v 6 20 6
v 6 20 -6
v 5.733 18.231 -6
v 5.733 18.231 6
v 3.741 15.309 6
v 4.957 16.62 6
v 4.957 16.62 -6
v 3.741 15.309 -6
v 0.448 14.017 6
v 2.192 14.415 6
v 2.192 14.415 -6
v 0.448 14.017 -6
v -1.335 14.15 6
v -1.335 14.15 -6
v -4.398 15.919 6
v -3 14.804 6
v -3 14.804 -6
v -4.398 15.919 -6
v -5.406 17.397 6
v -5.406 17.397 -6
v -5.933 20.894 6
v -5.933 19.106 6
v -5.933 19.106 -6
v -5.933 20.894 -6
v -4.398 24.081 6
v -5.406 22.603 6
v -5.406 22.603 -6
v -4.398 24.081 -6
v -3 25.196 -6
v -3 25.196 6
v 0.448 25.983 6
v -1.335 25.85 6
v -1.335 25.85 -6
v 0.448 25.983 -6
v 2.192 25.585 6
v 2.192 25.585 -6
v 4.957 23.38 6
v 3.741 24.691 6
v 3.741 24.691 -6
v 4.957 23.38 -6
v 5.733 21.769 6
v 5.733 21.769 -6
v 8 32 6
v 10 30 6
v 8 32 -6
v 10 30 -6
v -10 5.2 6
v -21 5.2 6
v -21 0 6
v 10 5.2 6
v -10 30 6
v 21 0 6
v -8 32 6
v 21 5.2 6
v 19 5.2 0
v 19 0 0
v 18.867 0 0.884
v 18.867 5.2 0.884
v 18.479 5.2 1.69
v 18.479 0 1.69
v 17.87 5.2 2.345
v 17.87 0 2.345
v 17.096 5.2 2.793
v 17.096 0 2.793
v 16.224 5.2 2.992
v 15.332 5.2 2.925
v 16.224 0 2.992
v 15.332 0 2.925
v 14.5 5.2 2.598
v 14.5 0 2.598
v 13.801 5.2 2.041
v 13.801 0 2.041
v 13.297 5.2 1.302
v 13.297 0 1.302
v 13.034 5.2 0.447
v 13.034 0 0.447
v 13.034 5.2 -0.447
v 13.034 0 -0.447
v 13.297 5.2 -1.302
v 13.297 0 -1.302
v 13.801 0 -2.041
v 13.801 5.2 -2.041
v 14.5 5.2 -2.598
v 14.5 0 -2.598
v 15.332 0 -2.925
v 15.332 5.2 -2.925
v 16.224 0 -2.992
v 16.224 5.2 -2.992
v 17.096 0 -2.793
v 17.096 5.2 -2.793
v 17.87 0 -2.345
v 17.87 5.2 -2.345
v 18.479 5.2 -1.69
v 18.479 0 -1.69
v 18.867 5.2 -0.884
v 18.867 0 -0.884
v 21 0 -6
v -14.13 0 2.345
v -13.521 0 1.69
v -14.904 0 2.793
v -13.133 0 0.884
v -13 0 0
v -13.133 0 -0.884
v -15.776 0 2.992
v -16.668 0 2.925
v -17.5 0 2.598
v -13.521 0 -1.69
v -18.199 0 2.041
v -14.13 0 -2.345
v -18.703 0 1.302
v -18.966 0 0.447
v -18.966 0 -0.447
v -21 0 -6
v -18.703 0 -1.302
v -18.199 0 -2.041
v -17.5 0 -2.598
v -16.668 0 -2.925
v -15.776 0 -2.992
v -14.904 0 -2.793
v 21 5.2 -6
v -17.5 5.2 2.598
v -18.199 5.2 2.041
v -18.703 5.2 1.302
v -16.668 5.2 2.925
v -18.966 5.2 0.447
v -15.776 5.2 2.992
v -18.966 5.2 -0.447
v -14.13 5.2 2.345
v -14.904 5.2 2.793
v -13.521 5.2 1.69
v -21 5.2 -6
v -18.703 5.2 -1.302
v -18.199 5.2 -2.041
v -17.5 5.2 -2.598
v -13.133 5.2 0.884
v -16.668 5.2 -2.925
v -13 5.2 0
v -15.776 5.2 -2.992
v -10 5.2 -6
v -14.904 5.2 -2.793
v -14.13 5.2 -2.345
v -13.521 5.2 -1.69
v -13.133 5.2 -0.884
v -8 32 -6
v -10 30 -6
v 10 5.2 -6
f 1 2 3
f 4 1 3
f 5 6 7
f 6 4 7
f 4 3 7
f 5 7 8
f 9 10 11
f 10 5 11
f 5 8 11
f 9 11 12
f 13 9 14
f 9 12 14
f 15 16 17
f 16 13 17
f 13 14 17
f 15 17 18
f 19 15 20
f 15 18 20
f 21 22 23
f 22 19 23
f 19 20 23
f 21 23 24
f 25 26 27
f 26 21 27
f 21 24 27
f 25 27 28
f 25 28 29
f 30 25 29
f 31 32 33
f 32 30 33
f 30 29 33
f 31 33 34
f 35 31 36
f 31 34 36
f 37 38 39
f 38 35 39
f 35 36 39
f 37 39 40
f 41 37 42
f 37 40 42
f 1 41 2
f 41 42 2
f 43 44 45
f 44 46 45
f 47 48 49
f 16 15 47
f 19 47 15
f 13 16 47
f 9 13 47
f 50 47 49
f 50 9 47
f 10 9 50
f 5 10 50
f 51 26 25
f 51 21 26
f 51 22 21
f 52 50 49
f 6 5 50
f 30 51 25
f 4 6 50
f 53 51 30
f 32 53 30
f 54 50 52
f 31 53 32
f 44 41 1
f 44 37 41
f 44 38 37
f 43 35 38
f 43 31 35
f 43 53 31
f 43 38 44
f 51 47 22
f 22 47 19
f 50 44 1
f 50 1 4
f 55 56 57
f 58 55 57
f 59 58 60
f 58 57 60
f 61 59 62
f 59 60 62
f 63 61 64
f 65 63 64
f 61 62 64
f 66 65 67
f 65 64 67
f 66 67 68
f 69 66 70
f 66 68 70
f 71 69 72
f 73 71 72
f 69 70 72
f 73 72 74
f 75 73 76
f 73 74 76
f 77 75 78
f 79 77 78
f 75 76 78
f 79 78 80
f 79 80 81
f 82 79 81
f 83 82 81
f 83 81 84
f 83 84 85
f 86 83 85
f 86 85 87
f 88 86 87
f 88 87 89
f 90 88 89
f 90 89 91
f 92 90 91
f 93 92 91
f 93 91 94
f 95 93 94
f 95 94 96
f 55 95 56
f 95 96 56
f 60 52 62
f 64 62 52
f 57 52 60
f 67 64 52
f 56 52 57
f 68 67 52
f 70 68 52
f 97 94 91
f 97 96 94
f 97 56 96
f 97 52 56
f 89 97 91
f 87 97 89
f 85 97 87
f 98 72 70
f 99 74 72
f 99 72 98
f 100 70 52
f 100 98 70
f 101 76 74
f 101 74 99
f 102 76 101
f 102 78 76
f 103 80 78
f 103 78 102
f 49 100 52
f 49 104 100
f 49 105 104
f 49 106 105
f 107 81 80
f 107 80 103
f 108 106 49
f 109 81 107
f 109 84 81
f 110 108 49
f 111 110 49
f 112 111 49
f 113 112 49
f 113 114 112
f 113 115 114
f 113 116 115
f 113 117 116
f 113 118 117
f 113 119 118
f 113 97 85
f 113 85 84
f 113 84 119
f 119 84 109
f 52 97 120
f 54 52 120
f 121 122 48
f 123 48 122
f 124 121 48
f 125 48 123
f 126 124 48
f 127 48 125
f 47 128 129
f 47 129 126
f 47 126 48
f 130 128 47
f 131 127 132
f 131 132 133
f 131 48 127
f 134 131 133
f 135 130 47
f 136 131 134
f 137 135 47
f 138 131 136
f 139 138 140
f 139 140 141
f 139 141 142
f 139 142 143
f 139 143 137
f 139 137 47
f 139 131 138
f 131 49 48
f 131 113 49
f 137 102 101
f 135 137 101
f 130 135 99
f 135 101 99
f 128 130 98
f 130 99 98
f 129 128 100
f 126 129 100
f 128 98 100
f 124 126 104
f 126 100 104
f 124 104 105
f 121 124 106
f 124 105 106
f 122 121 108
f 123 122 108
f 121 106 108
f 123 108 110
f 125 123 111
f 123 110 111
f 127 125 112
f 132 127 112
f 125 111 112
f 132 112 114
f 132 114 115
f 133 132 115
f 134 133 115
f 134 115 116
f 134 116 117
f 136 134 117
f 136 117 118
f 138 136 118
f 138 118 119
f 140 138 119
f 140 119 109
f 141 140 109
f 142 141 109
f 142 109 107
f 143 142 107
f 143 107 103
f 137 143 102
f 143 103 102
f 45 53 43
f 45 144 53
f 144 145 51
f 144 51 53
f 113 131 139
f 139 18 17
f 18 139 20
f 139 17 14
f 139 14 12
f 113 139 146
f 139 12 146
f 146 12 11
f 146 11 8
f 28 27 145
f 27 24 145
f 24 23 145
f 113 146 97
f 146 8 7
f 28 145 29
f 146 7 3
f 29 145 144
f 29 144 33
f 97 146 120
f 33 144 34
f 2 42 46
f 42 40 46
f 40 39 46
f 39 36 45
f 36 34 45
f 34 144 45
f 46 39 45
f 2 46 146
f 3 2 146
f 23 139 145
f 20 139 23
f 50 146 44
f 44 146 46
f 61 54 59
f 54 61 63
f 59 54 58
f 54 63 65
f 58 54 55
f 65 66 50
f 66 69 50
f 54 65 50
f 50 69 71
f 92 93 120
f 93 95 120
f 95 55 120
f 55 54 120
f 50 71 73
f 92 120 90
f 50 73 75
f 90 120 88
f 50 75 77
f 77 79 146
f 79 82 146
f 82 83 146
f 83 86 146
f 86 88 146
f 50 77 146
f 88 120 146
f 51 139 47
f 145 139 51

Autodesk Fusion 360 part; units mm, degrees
sketch "Boceto1" plane through (0, 0, 0) normal (0, 0, 1) x (1, 0, 0)
  line L0 (0, 0) -> (21, 0)
  line L1 (21, 0) -> (21, 5.2)
  line L2 (21, 5.2) -> (10, 5.2)
  line L3 (10, 5.2) -> (10, 30)
  line L4 (10, 30) -> (8, 32)
  line L5 (10, 30) -> (23.9079, 30) construction
  line L6 (8, 32) -> (0, 32)
  line L7 (0, 0) -> (0, 32) construction
  line L8 (-10, 30) -> (-8, 32)
  line L9 (-10, 5.2) -> (-10, 30)
  line L10 (-21, 0) -> (-21, 5.2)
  line L11 (-21, 5.2) -> (-10, 5.2)
  line L12 (-8, 32) -> (0, 32)
  circle A0 centre (0, 20) radius 6
  line L13 (0, 0) -> (-21, 0)
  dimension "d17" = 5.2
  dimension "d19" = 45
  dimension "d20" = 8
  dimension "d21" = 32
  dimension "d24" = 10
  dimension "d25" = 12
  dimension "d26" = 20
  dimension "d47" = 10
  dimension "d50" = 11
extrude "Extruir2" add sketch "Boceto1" along normal mid plane 12
sketch "Boceto7" plane through (0, 0, 0) normal (0, -1, 0) x (1, 0, 0)
  line L0 (21, -6) -> (21, 6)
  line L1 (21, 6) -> (-21, 6)
  line L2 (-21, 6) -> (-21, -6)
  line L3 (-21, -6) -> (21, -6)
  circle A0 centre (16, 0) radius 3
  circle A1 centre (-16, 0) radius 3
  dimension "d57" = 6
  dimension "d58" = 5
  dimension "d59" = 6
extrude "Extruir11" cut sketch "Boceto7" along normal mid plane 52 contours A0 | A1
extrude "Extruir6" [suppressed]
extrude "Extruir7" [suppressed]
component "Component" placed x (1, 0, 0) y (0, 1, 0) z (0, 0, 1) at (0, 0, 0)
